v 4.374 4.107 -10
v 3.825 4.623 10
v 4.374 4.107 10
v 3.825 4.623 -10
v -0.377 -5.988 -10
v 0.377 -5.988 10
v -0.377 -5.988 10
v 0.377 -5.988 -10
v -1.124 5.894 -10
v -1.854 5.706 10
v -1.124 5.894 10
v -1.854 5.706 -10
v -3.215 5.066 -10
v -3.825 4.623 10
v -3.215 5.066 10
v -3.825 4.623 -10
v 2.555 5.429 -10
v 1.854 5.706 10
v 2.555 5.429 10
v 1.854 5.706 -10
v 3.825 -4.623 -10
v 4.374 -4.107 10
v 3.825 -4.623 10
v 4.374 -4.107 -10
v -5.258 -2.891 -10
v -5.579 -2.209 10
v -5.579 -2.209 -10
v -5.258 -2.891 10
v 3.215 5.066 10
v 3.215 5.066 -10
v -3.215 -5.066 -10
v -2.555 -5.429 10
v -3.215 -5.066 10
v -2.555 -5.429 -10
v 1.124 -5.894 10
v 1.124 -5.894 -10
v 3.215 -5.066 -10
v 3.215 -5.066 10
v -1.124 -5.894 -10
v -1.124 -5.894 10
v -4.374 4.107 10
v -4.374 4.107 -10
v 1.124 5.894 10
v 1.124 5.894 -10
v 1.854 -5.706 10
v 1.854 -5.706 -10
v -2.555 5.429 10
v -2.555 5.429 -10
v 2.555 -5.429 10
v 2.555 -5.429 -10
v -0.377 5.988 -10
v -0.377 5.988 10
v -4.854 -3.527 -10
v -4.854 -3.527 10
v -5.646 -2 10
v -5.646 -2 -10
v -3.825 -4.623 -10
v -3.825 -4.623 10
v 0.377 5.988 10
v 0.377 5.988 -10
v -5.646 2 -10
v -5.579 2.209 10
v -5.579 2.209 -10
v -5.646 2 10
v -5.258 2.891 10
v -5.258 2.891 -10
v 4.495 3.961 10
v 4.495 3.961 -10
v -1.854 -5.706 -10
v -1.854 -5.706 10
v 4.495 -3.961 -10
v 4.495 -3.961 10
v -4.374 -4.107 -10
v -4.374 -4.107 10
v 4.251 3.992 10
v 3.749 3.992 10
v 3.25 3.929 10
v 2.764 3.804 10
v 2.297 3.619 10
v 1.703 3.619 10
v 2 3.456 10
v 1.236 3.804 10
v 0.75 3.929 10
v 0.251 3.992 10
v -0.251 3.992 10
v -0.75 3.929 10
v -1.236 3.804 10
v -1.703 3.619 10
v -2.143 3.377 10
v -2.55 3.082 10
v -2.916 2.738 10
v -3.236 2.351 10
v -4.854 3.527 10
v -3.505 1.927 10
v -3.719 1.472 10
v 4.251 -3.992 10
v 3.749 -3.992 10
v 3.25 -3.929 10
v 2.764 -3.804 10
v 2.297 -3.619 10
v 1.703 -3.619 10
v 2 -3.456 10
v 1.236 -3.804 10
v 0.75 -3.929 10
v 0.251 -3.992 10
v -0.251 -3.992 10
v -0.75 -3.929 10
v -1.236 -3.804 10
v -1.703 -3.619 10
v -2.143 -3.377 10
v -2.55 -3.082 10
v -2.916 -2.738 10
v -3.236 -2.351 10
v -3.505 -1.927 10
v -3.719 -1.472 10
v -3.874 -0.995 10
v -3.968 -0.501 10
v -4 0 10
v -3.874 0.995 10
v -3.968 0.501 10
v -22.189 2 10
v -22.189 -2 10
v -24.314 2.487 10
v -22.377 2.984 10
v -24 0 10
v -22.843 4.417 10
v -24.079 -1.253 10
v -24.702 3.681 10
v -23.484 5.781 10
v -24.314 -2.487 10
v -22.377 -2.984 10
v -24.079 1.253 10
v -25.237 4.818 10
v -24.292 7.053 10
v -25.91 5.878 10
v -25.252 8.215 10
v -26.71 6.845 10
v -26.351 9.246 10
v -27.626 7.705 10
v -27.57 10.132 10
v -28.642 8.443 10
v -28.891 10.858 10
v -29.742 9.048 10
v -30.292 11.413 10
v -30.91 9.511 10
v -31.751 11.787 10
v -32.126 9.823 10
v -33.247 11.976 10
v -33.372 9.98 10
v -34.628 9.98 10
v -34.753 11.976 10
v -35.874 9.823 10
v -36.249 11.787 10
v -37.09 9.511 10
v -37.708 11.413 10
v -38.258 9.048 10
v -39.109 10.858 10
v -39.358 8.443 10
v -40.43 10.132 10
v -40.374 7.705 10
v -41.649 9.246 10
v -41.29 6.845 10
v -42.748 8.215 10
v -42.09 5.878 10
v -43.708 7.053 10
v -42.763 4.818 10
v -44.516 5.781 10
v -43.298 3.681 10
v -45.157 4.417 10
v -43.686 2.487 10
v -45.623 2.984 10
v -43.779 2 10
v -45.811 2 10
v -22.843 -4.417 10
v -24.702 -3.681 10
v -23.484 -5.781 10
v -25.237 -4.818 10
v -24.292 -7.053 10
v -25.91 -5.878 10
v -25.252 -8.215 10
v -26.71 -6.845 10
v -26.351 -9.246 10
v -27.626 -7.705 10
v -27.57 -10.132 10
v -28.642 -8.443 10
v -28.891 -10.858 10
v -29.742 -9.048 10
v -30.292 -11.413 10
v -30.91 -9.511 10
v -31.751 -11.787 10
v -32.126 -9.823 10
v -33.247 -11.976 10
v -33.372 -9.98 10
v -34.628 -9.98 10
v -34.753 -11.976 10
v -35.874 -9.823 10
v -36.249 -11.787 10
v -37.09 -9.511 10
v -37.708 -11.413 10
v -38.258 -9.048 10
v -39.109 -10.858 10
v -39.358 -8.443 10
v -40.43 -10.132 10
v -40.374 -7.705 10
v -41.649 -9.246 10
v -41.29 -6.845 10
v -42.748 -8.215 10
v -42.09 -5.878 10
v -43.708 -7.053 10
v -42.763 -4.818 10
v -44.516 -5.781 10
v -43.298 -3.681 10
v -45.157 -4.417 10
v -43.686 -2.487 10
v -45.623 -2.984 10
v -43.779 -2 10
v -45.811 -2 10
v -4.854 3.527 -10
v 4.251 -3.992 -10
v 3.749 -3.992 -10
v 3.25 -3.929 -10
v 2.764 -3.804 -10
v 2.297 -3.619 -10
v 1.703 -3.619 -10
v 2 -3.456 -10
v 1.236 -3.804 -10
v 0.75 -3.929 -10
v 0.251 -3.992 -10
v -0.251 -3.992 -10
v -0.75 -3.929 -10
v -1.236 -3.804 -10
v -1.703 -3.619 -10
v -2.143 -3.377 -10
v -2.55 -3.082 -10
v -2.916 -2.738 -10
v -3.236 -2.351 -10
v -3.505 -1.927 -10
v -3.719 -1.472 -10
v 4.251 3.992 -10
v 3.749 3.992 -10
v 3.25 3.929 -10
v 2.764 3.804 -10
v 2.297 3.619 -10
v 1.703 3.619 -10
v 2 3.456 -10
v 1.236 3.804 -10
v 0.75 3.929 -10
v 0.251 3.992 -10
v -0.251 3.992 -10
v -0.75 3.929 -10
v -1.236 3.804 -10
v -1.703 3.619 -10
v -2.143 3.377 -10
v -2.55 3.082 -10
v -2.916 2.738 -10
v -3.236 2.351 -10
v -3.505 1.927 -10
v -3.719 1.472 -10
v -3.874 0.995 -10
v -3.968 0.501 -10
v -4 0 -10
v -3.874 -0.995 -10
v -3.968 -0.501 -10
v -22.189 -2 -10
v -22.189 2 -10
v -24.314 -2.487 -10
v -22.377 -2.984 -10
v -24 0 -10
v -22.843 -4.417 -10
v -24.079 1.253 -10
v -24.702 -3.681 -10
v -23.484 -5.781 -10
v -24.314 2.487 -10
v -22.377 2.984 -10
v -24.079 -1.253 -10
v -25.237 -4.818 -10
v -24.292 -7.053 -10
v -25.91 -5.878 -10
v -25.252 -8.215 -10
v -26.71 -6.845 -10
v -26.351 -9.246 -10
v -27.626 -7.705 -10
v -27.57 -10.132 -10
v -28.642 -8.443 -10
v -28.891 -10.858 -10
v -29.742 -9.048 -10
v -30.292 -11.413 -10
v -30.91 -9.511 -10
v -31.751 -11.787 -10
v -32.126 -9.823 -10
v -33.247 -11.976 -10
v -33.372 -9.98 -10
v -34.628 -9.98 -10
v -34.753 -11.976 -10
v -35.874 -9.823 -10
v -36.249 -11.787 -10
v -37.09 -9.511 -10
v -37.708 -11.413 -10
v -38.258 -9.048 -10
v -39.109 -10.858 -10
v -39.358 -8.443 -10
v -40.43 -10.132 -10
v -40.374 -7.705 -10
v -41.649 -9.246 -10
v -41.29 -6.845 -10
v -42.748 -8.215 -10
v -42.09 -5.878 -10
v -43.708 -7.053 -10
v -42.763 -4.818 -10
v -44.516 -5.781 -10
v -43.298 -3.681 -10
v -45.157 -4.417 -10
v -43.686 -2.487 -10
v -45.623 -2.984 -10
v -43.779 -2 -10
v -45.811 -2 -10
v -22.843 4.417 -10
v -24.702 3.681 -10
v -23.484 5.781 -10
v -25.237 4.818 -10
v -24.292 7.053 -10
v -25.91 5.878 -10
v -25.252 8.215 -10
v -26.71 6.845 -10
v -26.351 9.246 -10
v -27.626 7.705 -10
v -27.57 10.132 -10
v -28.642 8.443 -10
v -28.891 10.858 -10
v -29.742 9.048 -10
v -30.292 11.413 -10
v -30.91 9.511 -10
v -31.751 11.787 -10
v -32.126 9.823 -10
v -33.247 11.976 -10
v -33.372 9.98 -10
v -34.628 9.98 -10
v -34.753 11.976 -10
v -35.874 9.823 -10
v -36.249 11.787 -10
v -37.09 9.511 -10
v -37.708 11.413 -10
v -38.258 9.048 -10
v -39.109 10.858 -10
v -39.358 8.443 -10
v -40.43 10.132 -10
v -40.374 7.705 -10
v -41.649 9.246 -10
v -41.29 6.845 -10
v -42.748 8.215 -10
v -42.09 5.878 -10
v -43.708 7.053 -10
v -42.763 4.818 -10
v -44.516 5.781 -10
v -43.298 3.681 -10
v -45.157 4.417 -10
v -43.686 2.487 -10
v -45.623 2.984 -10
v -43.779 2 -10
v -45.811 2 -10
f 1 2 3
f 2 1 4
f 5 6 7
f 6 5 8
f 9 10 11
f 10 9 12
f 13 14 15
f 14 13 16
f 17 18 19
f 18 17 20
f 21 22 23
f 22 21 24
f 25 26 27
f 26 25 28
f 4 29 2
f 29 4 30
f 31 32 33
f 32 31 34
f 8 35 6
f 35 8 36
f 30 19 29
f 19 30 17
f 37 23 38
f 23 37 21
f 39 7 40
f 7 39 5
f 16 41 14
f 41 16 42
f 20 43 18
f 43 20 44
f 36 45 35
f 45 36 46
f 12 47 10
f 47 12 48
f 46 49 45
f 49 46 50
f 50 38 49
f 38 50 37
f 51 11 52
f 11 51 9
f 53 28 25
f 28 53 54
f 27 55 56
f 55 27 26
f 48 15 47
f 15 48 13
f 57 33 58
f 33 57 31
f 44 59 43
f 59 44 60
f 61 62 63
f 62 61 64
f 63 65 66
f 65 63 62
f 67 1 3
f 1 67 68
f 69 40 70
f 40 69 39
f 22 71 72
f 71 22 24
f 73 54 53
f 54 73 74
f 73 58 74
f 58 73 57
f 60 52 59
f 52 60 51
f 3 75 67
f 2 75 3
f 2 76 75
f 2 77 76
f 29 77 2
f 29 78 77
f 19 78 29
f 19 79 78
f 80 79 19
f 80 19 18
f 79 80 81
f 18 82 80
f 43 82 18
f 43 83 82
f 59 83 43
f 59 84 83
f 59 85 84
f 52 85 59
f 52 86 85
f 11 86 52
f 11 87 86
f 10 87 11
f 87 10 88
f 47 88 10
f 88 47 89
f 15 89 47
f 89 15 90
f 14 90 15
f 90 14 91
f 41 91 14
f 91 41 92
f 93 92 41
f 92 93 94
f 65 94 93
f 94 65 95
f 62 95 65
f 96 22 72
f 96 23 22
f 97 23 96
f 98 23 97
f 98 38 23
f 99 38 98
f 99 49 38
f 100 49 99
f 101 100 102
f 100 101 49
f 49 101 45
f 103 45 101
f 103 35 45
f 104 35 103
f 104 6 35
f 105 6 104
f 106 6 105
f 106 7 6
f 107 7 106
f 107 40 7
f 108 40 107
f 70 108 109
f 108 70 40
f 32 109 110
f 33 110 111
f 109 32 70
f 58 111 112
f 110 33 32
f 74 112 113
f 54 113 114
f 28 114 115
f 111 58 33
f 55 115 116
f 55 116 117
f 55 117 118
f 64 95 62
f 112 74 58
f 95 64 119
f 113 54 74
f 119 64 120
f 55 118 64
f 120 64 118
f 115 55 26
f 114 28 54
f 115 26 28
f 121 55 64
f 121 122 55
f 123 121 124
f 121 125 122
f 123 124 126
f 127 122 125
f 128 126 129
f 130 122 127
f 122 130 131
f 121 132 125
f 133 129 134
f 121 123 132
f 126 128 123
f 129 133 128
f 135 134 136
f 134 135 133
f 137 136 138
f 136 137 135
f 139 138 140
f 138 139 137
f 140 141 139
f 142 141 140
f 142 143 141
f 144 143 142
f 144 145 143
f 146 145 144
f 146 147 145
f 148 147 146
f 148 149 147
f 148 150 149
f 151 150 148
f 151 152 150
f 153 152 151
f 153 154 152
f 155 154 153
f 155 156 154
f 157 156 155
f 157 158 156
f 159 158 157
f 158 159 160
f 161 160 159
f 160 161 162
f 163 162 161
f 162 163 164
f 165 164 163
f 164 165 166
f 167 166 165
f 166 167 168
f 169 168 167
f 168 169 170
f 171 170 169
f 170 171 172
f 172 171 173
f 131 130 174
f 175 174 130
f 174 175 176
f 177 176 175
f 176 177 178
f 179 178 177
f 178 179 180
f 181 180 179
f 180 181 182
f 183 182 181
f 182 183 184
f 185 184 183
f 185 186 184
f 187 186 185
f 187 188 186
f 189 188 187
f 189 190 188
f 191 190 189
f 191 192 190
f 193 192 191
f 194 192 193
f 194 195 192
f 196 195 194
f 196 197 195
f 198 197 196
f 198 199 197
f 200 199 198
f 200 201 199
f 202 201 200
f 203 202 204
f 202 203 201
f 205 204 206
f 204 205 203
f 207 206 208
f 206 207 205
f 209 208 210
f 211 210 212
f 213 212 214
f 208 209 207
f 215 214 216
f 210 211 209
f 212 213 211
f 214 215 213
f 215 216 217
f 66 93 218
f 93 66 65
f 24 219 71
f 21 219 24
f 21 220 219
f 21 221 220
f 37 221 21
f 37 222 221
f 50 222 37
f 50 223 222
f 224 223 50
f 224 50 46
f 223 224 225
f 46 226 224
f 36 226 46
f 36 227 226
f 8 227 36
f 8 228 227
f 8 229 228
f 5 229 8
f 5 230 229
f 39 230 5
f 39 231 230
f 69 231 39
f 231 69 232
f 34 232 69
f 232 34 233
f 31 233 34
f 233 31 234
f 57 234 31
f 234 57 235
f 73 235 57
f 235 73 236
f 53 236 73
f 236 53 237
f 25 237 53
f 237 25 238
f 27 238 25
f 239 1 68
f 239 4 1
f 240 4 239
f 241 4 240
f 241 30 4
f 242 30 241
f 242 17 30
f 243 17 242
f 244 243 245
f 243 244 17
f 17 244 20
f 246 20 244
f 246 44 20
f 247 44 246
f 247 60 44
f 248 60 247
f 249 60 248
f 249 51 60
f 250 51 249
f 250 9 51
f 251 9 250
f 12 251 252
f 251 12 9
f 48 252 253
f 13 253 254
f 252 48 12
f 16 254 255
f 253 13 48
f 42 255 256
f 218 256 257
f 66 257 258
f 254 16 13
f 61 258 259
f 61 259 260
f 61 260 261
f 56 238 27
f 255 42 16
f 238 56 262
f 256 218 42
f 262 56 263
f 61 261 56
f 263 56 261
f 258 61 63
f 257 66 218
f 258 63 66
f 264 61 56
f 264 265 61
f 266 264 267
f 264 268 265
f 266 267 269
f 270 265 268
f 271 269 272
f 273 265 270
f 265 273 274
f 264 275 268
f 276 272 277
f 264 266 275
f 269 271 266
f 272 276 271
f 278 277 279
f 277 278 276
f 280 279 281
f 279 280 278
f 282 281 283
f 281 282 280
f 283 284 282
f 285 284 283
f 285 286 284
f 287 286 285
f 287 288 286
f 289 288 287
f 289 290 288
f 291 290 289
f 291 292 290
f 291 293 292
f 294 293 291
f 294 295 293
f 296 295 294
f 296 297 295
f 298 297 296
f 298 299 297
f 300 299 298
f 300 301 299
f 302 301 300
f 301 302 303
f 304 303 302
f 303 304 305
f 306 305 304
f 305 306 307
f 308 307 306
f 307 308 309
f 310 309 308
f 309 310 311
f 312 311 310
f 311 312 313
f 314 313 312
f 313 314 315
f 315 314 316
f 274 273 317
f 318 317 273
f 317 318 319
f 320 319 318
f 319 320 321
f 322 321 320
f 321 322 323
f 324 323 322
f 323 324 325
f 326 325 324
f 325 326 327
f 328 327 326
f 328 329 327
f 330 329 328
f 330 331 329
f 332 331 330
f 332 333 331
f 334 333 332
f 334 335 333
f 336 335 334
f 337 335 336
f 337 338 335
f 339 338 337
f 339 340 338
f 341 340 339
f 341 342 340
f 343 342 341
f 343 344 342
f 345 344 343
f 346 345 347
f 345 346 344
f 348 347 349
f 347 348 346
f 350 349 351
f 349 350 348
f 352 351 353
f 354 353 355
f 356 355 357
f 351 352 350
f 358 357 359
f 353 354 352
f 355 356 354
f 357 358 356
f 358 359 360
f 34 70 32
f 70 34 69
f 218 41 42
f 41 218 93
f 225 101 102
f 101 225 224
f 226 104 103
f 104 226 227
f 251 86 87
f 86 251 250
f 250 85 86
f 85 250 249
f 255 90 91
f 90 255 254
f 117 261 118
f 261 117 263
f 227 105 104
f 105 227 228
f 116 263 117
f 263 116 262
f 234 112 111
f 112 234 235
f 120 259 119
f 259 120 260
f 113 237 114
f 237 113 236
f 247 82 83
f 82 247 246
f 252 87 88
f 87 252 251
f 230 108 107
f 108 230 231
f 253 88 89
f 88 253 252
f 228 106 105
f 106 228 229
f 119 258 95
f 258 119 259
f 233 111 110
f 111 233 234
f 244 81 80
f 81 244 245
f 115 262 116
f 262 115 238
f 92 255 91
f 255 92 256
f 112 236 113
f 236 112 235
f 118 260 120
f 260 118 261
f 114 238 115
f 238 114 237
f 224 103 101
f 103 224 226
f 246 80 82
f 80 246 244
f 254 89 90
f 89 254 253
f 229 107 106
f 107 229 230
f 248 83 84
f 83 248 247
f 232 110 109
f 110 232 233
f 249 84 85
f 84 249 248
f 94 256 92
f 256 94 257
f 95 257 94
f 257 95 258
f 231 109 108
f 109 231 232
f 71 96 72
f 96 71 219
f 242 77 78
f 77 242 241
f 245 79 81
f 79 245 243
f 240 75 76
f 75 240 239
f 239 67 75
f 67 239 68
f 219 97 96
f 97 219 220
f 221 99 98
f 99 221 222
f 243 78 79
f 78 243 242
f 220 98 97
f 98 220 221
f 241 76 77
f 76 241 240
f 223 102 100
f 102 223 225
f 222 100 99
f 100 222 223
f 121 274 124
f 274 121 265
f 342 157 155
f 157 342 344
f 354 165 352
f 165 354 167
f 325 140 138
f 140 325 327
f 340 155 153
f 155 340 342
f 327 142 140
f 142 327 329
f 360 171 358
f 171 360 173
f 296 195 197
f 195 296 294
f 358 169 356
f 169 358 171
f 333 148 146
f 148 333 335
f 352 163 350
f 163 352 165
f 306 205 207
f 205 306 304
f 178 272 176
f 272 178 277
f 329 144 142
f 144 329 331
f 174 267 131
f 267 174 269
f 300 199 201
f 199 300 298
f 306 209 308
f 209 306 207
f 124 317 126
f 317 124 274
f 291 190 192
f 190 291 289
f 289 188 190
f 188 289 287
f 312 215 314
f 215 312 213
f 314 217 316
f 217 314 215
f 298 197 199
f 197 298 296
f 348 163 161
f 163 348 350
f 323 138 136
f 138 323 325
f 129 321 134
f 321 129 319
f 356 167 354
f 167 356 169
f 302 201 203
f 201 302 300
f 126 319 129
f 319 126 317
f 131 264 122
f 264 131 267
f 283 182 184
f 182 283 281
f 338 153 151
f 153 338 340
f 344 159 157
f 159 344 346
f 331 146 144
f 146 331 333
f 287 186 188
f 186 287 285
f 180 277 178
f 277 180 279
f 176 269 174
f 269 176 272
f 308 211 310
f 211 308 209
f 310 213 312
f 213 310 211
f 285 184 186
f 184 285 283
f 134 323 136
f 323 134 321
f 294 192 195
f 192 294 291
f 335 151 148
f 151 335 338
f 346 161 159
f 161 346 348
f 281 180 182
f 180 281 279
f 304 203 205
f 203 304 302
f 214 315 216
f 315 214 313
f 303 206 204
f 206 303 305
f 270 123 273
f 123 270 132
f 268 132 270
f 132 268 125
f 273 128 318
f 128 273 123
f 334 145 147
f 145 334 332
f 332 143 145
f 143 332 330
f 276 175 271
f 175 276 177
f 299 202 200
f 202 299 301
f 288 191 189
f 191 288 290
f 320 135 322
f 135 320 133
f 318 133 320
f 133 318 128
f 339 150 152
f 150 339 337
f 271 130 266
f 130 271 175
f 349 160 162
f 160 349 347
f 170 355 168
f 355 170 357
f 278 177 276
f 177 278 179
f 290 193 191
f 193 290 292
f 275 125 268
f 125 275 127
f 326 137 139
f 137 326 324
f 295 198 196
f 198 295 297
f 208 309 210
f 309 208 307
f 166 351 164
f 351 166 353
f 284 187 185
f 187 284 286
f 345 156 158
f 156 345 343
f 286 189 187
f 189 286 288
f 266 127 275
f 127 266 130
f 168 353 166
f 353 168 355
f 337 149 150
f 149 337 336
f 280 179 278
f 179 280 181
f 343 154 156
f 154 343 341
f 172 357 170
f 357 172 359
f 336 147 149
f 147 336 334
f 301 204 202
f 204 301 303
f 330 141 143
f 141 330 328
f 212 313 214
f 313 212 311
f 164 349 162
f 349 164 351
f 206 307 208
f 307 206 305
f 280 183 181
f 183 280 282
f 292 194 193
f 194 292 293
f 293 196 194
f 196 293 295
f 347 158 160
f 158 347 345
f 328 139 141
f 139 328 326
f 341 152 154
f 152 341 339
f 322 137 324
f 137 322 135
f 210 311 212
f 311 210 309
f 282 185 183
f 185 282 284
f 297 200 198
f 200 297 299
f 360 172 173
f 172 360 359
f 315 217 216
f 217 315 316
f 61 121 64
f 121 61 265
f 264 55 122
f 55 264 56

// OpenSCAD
// Tutor diameter
TUTOR_DIAMETER = 8; // [4:30]
// Thickness of the cylinders 
HOOK_THICKNESS = 2; // [1:10]
// Thickness of the hook
THICKNESS = 20; // [2:20]
// Length of the neck between the two hooks
TUTOR_LENGTH = 20; // [1:100]
// Width of the neck
TUTOR_WIDTH = 4; // [1:20]
// Plant hook diameter
HOOK_DIAMETER = 20; // [10:100]
// Opened space to insert the plant inside the hook
HOOK_SPACING = 4; // [2:20]

$fn = 50;
difference() {
    cylinder(h = THICKNESS, d = TUTOR_DIAMETER + 2 * HOOK_THICKNESS, center = true);
    cylinder(h = THICKNESS, d = TUTOR_DIAMETER, center = true);
    translate([TUTOR_DIAMETER/2, 0, 0]) cylinder(h = THICKNESS, d = TUTOR_DIAMETER, center = true);
}
translate([-(TUTOR_LENGTH/2 + TUTOR_DIAMETER/2), 0, 0]) cube([TUTOR_LENGTH, TUTOR_WIDTH, THICKNESS], center = true);

translate([-(TUTOR_LENGTH + TUTOR_DIAMETER/2 + HOOK_DIAMETER / 2), 0, 0])  
difference() {
    cylinder(h = THICKNESS, d = HOOK_DIAMETER + 2 * HOOK_THICKNESS, center = true);
    cylinder(h = THICKNESS, d = HOOK_DIAMETER, center = true);
    color("green") translate([-(HOOK_DIAMETER / 2), 0, 0]) cube([THICKNESS, HOOK_SPACING, THICKNESS], center = true);
}
